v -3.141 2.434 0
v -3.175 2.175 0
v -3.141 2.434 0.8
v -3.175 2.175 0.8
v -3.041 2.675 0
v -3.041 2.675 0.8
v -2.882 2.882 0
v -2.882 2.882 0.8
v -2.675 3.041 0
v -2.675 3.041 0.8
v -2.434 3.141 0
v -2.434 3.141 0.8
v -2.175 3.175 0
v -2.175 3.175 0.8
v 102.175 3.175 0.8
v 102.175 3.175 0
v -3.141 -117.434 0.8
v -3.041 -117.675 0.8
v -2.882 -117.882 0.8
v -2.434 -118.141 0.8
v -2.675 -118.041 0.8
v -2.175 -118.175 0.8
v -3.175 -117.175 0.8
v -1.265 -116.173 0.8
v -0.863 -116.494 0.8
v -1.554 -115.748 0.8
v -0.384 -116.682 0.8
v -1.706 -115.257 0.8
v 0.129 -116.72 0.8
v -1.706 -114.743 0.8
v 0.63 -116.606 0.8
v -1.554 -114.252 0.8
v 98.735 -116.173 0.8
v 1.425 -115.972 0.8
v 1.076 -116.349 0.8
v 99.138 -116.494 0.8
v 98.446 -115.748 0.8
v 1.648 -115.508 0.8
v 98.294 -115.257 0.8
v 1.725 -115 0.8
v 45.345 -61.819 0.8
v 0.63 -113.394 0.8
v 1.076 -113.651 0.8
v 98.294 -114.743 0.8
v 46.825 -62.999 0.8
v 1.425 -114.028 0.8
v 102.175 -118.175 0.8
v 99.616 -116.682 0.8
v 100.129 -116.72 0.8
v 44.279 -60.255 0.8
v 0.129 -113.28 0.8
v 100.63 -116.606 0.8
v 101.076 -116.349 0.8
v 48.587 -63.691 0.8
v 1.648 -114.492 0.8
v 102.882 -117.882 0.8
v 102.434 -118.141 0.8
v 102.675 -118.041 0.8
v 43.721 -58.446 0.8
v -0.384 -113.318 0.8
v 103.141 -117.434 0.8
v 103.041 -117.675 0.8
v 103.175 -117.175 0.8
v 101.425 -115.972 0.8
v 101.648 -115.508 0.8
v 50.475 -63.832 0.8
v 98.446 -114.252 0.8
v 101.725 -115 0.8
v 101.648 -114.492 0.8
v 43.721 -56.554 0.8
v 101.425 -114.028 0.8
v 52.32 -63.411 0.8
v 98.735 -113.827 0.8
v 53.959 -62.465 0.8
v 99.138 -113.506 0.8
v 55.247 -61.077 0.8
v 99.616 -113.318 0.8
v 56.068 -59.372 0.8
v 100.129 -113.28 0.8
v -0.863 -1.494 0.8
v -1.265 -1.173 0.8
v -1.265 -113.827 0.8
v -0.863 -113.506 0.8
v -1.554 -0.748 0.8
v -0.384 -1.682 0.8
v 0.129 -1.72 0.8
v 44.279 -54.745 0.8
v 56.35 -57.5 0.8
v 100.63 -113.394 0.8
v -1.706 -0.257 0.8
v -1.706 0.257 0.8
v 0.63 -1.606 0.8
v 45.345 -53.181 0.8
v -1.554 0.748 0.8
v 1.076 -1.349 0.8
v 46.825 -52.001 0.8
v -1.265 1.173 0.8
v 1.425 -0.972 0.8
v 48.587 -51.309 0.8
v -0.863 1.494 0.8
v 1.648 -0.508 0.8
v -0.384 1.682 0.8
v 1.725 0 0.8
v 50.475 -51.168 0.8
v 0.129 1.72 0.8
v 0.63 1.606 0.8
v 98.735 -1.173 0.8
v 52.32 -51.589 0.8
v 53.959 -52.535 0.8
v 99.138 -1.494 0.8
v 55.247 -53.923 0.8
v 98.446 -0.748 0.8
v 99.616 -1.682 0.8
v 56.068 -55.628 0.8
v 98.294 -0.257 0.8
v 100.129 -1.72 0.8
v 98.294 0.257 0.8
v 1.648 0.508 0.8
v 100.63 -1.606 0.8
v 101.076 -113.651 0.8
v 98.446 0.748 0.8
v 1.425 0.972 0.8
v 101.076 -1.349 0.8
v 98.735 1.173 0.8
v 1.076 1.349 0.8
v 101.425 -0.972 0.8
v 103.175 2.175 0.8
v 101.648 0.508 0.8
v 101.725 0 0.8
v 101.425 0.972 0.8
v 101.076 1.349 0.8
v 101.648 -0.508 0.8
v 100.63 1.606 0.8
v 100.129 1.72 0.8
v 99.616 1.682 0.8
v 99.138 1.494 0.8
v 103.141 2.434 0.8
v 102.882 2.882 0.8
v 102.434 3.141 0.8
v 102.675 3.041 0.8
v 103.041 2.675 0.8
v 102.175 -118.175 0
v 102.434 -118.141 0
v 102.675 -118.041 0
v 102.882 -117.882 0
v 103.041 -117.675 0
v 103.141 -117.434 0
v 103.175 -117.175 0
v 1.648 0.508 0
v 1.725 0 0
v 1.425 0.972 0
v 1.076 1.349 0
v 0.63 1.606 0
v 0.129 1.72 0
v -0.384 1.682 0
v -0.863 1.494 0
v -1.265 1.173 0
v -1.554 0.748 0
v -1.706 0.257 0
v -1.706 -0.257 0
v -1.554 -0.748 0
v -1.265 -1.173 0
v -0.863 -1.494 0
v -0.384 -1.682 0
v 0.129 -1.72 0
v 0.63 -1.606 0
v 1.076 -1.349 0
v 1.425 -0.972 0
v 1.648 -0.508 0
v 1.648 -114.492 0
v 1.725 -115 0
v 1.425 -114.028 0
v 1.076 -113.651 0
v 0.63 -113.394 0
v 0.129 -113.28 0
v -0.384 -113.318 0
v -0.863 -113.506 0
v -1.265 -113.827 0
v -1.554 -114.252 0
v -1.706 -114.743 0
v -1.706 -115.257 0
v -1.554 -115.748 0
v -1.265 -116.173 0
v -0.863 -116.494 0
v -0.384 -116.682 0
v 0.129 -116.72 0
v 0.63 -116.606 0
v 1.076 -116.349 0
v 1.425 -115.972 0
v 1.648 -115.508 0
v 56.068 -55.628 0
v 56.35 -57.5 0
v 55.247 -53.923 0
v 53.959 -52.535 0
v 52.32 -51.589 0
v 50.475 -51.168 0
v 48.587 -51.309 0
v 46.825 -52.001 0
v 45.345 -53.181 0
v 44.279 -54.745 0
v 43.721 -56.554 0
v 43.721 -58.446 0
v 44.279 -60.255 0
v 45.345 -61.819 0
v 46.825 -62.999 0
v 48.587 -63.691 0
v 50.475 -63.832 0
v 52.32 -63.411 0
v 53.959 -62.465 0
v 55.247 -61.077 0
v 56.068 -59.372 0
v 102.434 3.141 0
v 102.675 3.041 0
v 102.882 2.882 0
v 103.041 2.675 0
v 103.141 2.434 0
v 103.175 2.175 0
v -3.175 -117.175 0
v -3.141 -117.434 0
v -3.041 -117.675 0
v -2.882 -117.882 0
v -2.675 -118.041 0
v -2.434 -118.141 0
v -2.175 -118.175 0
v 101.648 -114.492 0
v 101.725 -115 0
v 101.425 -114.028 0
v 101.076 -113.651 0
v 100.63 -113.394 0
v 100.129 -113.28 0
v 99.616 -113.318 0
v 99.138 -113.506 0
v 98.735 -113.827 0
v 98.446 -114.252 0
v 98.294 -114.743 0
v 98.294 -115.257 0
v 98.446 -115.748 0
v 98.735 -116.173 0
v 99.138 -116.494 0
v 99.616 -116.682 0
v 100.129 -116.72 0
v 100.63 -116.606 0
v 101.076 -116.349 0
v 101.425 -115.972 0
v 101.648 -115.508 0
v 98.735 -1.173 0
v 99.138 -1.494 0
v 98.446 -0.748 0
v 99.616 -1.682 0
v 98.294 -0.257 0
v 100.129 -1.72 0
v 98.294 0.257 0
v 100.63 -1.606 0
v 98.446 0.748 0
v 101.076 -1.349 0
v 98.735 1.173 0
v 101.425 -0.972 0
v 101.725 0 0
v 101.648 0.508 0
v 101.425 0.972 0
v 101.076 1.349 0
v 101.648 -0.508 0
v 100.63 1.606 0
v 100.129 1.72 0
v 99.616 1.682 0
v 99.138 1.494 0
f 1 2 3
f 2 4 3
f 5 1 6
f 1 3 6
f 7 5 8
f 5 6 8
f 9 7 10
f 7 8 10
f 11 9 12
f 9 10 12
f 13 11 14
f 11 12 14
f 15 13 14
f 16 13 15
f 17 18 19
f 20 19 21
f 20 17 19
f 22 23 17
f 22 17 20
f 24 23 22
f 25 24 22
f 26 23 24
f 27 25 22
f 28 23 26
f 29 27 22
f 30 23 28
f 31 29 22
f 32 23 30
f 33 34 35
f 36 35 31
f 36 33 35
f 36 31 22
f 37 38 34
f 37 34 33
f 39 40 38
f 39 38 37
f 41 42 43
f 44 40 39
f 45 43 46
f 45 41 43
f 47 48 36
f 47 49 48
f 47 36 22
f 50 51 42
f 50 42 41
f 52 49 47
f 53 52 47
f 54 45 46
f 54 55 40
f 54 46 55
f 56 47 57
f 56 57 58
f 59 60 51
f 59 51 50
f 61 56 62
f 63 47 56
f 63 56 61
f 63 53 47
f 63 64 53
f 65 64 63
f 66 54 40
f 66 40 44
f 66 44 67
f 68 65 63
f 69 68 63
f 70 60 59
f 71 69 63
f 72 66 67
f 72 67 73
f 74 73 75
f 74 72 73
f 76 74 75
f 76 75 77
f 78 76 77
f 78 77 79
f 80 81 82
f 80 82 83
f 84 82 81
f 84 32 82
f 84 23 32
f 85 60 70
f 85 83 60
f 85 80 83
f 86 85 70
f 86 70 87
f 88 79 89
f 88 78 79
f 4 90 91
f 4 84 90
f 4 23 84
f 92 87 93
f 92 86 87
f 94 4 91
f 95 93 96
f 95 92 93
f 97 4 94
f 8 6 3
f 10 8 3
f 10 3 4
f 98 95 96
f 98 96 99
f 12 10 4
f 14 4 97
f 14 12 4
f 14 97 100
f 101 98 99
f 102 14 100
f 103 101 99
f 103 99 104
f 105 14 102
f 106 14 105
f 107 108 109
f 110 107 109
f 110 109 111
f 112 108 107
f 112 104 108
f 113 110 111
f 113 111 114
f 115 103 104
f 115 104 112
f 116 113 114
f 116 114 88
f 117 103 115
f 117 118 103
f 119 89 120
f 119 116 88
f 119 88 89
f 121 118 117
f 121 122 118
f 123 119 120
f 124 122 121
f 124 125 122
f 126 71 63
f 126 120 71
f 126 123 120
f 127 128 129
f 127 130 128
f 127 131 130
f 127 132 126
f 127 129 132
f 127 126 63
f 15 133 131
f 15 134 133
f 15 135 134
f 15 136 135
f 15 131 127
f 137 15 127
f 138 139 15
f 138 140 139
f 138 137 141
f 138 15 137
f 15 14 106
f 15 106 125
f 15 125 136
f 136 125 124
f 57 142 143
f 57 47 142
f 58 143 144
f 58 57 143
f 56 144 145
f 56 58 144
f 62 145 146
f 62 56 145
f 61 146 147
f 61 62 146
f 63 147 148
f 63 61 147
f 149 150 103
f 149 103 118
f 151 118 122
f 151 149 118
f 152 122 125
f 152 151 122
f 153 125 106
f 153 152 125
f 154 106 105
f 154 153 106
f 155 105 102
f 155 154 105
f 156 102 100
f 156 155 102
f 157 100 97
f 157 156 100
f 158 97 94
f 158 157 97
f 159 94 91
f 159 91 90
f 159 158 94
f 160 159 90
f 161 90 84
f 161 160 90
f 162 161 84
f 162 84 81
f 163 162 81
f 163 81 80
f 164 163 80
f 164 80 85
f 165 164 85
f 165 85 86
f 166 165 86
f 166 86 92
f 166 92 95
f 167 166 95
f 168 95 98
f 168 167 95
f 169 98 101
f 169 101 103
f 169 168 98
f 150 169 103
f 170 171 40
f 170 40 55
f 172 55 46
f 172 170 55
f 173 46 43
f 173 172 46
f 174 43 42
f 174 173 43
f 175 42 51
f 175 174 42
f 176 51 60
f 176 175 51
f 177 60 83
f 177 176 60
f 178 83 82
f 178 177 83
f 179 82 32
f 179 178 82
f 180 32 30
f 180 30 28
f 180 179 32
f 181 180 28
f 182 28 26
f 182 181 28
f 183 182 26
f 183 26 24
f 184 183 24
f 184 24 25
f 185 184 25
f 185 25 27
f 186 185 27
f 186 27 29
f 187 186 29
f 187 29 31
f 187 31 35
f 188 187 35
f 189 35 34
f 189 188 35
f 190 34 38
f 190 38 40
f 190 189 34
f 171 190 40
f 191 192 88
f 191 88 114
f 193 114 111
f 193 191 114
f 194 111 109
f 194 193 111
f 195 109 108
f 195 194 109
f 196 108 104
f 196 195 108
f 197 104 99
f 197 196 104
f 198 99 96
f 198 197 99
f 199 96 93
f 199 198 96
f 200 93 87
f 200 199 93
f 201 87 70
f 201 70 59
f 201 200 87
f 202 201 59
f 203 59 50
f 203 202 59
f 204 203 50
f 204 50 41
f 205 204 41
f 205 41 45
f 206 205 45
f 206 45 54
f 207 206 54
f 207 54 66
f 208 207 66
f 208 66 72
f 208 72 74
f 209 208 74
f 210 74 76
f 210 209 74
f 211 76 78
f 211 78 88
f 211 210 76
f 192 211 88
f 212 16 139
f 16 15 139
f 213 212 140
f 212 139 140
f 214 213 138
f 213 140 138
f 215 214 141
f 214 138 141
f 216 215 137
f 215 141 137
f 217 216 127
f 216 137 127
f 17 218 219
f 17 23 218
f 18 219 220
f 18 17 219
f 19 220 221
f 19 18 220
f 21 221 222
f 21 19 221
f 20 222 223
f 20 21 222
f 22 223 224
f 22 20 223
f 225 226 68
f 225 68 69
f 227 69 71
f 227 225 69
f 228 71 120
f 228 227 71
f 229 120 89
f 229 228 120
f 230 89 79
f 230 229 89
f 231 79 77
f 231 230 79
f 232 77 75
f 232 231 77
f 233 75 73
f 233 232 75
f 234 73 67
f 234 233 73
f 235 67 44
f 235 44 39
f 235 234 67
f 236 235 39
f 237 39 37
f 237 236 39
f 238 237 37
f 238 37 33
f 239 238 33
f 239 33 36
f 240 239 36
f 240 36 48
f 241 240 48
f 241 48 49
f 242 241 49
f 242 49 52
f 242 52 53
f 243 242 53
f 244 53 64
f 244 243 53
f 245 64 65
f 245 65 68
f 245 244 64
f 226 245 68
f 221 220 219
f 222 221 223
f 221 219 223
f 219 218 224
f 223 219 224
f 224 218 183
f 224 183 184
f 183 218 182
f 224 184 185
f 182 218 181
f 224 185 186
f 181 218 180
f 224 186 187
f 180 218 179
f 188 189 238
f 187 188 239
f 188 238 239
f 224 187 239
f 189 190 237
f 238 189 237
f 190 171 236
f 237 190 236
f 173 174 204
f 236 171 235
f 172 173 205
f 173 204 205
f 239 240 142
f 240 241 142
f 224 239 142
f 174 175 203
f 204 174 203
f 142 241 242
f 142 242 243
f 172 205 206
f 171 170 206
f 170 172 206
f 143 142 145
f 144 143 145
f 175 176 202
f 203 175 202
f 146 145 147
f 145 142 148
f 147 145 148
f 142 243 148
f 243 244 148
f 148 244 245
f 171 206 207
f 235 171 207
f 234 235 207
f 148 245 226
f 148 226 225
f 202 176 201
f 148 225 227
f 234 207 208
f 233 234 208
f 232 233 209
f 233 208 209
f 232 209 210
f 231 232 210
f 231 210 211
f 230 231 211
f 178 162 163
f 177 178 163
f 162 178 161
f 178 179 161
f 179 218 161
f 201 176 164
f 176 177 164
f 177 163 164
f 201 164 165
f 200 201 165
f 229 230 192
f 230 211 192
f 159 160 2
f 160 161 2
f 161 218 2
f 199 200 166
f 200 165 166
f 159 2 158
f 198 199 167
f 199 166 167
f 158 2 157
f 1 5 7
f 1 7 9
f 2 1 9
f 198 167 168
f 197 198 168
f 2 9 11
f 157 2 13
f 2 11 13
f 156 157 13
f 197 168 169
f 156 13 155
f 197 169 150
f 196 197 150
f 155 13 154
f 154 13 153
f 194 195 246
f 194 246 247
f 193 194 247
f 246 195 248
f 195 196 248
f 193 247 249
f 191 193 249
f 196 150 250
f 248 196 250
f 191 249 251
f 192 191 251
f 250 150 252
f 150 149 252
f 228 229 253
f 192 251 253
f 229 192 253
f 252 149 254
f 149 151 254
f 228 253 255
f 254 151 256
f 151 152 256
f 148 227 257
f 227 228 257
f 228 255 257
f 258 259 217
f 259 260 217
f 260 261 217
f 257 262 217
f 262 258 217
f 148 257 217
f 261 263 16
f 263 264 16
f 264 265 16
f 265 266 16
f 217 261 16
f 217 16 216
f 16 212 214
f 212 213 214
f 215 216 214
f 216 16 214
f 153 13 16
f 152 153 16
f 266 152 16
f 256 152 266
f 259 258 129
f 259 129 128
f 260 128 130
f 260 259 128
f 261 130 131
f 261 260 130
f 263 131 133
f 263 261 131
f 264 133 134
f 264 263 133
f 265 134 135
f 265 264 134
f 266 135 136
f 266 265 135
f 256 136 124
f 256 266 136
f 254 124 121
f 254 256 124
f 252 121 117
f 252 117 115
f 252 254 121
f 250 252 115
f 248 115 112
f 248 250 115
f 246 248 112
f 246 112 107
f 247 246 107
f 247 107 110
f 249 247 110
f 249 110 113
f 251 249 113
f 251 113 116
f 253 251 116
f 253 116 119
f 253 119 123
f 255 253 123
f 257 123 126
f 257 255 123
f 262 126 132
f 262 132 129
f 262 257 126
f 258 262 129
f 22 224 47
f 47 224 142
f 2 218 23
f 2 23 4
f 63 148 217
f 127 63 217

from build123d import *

# Parameters (mm, degrees)
SKETCH1_W           = 106.35
SKETCH1_H           = 121.35
SKETCH1_R           = 1.725
SKETCH1_R_2         = 6.35
BOSS_EXTRUDE1_DEPTH = 0.8
FILLET1_R           = 1


with BuildPart() as part:
    # Sketch1 → Boss-Extrude1 (new body)
    with BuildSketch(Plane.XY):
        with Locations((50, -57.5)):
            Rectangle(SKETCH1_W, SKETCH1_H)
        Circle(SKETCH1_R, mode=Mode.SUBTRACT)
        with Locations((100, 0)):
            Circle(SKETCH1_R, mode=Mode.SUBTRACT)
        with Locations((100, -115)):
            Circle(SKETCH1_R, mode=Mode.SUBTRACT)
        with Locations((0, -115)):
            Circle(SKETCH1_R, mode=Mode.SUBTRACT)
        with Locations((50, -57.5)):
            Circle(SKETCH1_R_2, mode=Mode.SUBTRACT)
    extrude(amount=BOSS_EXTRUDE1_DEPTH)

    # Fillet1
    fillet1_edges = [part.edges().sort_by_distance(p)[0] for p in [
        (-3.175, 3.175, 0.4),
        (103.175, 3.175, 0.4),
        (103.175, -118.175, 0.4),
        (-3.175, -118.175, 0.4),
    ]]
    fillet(fillet1_edges, radius=FILLET1_R)


solid = part.part
